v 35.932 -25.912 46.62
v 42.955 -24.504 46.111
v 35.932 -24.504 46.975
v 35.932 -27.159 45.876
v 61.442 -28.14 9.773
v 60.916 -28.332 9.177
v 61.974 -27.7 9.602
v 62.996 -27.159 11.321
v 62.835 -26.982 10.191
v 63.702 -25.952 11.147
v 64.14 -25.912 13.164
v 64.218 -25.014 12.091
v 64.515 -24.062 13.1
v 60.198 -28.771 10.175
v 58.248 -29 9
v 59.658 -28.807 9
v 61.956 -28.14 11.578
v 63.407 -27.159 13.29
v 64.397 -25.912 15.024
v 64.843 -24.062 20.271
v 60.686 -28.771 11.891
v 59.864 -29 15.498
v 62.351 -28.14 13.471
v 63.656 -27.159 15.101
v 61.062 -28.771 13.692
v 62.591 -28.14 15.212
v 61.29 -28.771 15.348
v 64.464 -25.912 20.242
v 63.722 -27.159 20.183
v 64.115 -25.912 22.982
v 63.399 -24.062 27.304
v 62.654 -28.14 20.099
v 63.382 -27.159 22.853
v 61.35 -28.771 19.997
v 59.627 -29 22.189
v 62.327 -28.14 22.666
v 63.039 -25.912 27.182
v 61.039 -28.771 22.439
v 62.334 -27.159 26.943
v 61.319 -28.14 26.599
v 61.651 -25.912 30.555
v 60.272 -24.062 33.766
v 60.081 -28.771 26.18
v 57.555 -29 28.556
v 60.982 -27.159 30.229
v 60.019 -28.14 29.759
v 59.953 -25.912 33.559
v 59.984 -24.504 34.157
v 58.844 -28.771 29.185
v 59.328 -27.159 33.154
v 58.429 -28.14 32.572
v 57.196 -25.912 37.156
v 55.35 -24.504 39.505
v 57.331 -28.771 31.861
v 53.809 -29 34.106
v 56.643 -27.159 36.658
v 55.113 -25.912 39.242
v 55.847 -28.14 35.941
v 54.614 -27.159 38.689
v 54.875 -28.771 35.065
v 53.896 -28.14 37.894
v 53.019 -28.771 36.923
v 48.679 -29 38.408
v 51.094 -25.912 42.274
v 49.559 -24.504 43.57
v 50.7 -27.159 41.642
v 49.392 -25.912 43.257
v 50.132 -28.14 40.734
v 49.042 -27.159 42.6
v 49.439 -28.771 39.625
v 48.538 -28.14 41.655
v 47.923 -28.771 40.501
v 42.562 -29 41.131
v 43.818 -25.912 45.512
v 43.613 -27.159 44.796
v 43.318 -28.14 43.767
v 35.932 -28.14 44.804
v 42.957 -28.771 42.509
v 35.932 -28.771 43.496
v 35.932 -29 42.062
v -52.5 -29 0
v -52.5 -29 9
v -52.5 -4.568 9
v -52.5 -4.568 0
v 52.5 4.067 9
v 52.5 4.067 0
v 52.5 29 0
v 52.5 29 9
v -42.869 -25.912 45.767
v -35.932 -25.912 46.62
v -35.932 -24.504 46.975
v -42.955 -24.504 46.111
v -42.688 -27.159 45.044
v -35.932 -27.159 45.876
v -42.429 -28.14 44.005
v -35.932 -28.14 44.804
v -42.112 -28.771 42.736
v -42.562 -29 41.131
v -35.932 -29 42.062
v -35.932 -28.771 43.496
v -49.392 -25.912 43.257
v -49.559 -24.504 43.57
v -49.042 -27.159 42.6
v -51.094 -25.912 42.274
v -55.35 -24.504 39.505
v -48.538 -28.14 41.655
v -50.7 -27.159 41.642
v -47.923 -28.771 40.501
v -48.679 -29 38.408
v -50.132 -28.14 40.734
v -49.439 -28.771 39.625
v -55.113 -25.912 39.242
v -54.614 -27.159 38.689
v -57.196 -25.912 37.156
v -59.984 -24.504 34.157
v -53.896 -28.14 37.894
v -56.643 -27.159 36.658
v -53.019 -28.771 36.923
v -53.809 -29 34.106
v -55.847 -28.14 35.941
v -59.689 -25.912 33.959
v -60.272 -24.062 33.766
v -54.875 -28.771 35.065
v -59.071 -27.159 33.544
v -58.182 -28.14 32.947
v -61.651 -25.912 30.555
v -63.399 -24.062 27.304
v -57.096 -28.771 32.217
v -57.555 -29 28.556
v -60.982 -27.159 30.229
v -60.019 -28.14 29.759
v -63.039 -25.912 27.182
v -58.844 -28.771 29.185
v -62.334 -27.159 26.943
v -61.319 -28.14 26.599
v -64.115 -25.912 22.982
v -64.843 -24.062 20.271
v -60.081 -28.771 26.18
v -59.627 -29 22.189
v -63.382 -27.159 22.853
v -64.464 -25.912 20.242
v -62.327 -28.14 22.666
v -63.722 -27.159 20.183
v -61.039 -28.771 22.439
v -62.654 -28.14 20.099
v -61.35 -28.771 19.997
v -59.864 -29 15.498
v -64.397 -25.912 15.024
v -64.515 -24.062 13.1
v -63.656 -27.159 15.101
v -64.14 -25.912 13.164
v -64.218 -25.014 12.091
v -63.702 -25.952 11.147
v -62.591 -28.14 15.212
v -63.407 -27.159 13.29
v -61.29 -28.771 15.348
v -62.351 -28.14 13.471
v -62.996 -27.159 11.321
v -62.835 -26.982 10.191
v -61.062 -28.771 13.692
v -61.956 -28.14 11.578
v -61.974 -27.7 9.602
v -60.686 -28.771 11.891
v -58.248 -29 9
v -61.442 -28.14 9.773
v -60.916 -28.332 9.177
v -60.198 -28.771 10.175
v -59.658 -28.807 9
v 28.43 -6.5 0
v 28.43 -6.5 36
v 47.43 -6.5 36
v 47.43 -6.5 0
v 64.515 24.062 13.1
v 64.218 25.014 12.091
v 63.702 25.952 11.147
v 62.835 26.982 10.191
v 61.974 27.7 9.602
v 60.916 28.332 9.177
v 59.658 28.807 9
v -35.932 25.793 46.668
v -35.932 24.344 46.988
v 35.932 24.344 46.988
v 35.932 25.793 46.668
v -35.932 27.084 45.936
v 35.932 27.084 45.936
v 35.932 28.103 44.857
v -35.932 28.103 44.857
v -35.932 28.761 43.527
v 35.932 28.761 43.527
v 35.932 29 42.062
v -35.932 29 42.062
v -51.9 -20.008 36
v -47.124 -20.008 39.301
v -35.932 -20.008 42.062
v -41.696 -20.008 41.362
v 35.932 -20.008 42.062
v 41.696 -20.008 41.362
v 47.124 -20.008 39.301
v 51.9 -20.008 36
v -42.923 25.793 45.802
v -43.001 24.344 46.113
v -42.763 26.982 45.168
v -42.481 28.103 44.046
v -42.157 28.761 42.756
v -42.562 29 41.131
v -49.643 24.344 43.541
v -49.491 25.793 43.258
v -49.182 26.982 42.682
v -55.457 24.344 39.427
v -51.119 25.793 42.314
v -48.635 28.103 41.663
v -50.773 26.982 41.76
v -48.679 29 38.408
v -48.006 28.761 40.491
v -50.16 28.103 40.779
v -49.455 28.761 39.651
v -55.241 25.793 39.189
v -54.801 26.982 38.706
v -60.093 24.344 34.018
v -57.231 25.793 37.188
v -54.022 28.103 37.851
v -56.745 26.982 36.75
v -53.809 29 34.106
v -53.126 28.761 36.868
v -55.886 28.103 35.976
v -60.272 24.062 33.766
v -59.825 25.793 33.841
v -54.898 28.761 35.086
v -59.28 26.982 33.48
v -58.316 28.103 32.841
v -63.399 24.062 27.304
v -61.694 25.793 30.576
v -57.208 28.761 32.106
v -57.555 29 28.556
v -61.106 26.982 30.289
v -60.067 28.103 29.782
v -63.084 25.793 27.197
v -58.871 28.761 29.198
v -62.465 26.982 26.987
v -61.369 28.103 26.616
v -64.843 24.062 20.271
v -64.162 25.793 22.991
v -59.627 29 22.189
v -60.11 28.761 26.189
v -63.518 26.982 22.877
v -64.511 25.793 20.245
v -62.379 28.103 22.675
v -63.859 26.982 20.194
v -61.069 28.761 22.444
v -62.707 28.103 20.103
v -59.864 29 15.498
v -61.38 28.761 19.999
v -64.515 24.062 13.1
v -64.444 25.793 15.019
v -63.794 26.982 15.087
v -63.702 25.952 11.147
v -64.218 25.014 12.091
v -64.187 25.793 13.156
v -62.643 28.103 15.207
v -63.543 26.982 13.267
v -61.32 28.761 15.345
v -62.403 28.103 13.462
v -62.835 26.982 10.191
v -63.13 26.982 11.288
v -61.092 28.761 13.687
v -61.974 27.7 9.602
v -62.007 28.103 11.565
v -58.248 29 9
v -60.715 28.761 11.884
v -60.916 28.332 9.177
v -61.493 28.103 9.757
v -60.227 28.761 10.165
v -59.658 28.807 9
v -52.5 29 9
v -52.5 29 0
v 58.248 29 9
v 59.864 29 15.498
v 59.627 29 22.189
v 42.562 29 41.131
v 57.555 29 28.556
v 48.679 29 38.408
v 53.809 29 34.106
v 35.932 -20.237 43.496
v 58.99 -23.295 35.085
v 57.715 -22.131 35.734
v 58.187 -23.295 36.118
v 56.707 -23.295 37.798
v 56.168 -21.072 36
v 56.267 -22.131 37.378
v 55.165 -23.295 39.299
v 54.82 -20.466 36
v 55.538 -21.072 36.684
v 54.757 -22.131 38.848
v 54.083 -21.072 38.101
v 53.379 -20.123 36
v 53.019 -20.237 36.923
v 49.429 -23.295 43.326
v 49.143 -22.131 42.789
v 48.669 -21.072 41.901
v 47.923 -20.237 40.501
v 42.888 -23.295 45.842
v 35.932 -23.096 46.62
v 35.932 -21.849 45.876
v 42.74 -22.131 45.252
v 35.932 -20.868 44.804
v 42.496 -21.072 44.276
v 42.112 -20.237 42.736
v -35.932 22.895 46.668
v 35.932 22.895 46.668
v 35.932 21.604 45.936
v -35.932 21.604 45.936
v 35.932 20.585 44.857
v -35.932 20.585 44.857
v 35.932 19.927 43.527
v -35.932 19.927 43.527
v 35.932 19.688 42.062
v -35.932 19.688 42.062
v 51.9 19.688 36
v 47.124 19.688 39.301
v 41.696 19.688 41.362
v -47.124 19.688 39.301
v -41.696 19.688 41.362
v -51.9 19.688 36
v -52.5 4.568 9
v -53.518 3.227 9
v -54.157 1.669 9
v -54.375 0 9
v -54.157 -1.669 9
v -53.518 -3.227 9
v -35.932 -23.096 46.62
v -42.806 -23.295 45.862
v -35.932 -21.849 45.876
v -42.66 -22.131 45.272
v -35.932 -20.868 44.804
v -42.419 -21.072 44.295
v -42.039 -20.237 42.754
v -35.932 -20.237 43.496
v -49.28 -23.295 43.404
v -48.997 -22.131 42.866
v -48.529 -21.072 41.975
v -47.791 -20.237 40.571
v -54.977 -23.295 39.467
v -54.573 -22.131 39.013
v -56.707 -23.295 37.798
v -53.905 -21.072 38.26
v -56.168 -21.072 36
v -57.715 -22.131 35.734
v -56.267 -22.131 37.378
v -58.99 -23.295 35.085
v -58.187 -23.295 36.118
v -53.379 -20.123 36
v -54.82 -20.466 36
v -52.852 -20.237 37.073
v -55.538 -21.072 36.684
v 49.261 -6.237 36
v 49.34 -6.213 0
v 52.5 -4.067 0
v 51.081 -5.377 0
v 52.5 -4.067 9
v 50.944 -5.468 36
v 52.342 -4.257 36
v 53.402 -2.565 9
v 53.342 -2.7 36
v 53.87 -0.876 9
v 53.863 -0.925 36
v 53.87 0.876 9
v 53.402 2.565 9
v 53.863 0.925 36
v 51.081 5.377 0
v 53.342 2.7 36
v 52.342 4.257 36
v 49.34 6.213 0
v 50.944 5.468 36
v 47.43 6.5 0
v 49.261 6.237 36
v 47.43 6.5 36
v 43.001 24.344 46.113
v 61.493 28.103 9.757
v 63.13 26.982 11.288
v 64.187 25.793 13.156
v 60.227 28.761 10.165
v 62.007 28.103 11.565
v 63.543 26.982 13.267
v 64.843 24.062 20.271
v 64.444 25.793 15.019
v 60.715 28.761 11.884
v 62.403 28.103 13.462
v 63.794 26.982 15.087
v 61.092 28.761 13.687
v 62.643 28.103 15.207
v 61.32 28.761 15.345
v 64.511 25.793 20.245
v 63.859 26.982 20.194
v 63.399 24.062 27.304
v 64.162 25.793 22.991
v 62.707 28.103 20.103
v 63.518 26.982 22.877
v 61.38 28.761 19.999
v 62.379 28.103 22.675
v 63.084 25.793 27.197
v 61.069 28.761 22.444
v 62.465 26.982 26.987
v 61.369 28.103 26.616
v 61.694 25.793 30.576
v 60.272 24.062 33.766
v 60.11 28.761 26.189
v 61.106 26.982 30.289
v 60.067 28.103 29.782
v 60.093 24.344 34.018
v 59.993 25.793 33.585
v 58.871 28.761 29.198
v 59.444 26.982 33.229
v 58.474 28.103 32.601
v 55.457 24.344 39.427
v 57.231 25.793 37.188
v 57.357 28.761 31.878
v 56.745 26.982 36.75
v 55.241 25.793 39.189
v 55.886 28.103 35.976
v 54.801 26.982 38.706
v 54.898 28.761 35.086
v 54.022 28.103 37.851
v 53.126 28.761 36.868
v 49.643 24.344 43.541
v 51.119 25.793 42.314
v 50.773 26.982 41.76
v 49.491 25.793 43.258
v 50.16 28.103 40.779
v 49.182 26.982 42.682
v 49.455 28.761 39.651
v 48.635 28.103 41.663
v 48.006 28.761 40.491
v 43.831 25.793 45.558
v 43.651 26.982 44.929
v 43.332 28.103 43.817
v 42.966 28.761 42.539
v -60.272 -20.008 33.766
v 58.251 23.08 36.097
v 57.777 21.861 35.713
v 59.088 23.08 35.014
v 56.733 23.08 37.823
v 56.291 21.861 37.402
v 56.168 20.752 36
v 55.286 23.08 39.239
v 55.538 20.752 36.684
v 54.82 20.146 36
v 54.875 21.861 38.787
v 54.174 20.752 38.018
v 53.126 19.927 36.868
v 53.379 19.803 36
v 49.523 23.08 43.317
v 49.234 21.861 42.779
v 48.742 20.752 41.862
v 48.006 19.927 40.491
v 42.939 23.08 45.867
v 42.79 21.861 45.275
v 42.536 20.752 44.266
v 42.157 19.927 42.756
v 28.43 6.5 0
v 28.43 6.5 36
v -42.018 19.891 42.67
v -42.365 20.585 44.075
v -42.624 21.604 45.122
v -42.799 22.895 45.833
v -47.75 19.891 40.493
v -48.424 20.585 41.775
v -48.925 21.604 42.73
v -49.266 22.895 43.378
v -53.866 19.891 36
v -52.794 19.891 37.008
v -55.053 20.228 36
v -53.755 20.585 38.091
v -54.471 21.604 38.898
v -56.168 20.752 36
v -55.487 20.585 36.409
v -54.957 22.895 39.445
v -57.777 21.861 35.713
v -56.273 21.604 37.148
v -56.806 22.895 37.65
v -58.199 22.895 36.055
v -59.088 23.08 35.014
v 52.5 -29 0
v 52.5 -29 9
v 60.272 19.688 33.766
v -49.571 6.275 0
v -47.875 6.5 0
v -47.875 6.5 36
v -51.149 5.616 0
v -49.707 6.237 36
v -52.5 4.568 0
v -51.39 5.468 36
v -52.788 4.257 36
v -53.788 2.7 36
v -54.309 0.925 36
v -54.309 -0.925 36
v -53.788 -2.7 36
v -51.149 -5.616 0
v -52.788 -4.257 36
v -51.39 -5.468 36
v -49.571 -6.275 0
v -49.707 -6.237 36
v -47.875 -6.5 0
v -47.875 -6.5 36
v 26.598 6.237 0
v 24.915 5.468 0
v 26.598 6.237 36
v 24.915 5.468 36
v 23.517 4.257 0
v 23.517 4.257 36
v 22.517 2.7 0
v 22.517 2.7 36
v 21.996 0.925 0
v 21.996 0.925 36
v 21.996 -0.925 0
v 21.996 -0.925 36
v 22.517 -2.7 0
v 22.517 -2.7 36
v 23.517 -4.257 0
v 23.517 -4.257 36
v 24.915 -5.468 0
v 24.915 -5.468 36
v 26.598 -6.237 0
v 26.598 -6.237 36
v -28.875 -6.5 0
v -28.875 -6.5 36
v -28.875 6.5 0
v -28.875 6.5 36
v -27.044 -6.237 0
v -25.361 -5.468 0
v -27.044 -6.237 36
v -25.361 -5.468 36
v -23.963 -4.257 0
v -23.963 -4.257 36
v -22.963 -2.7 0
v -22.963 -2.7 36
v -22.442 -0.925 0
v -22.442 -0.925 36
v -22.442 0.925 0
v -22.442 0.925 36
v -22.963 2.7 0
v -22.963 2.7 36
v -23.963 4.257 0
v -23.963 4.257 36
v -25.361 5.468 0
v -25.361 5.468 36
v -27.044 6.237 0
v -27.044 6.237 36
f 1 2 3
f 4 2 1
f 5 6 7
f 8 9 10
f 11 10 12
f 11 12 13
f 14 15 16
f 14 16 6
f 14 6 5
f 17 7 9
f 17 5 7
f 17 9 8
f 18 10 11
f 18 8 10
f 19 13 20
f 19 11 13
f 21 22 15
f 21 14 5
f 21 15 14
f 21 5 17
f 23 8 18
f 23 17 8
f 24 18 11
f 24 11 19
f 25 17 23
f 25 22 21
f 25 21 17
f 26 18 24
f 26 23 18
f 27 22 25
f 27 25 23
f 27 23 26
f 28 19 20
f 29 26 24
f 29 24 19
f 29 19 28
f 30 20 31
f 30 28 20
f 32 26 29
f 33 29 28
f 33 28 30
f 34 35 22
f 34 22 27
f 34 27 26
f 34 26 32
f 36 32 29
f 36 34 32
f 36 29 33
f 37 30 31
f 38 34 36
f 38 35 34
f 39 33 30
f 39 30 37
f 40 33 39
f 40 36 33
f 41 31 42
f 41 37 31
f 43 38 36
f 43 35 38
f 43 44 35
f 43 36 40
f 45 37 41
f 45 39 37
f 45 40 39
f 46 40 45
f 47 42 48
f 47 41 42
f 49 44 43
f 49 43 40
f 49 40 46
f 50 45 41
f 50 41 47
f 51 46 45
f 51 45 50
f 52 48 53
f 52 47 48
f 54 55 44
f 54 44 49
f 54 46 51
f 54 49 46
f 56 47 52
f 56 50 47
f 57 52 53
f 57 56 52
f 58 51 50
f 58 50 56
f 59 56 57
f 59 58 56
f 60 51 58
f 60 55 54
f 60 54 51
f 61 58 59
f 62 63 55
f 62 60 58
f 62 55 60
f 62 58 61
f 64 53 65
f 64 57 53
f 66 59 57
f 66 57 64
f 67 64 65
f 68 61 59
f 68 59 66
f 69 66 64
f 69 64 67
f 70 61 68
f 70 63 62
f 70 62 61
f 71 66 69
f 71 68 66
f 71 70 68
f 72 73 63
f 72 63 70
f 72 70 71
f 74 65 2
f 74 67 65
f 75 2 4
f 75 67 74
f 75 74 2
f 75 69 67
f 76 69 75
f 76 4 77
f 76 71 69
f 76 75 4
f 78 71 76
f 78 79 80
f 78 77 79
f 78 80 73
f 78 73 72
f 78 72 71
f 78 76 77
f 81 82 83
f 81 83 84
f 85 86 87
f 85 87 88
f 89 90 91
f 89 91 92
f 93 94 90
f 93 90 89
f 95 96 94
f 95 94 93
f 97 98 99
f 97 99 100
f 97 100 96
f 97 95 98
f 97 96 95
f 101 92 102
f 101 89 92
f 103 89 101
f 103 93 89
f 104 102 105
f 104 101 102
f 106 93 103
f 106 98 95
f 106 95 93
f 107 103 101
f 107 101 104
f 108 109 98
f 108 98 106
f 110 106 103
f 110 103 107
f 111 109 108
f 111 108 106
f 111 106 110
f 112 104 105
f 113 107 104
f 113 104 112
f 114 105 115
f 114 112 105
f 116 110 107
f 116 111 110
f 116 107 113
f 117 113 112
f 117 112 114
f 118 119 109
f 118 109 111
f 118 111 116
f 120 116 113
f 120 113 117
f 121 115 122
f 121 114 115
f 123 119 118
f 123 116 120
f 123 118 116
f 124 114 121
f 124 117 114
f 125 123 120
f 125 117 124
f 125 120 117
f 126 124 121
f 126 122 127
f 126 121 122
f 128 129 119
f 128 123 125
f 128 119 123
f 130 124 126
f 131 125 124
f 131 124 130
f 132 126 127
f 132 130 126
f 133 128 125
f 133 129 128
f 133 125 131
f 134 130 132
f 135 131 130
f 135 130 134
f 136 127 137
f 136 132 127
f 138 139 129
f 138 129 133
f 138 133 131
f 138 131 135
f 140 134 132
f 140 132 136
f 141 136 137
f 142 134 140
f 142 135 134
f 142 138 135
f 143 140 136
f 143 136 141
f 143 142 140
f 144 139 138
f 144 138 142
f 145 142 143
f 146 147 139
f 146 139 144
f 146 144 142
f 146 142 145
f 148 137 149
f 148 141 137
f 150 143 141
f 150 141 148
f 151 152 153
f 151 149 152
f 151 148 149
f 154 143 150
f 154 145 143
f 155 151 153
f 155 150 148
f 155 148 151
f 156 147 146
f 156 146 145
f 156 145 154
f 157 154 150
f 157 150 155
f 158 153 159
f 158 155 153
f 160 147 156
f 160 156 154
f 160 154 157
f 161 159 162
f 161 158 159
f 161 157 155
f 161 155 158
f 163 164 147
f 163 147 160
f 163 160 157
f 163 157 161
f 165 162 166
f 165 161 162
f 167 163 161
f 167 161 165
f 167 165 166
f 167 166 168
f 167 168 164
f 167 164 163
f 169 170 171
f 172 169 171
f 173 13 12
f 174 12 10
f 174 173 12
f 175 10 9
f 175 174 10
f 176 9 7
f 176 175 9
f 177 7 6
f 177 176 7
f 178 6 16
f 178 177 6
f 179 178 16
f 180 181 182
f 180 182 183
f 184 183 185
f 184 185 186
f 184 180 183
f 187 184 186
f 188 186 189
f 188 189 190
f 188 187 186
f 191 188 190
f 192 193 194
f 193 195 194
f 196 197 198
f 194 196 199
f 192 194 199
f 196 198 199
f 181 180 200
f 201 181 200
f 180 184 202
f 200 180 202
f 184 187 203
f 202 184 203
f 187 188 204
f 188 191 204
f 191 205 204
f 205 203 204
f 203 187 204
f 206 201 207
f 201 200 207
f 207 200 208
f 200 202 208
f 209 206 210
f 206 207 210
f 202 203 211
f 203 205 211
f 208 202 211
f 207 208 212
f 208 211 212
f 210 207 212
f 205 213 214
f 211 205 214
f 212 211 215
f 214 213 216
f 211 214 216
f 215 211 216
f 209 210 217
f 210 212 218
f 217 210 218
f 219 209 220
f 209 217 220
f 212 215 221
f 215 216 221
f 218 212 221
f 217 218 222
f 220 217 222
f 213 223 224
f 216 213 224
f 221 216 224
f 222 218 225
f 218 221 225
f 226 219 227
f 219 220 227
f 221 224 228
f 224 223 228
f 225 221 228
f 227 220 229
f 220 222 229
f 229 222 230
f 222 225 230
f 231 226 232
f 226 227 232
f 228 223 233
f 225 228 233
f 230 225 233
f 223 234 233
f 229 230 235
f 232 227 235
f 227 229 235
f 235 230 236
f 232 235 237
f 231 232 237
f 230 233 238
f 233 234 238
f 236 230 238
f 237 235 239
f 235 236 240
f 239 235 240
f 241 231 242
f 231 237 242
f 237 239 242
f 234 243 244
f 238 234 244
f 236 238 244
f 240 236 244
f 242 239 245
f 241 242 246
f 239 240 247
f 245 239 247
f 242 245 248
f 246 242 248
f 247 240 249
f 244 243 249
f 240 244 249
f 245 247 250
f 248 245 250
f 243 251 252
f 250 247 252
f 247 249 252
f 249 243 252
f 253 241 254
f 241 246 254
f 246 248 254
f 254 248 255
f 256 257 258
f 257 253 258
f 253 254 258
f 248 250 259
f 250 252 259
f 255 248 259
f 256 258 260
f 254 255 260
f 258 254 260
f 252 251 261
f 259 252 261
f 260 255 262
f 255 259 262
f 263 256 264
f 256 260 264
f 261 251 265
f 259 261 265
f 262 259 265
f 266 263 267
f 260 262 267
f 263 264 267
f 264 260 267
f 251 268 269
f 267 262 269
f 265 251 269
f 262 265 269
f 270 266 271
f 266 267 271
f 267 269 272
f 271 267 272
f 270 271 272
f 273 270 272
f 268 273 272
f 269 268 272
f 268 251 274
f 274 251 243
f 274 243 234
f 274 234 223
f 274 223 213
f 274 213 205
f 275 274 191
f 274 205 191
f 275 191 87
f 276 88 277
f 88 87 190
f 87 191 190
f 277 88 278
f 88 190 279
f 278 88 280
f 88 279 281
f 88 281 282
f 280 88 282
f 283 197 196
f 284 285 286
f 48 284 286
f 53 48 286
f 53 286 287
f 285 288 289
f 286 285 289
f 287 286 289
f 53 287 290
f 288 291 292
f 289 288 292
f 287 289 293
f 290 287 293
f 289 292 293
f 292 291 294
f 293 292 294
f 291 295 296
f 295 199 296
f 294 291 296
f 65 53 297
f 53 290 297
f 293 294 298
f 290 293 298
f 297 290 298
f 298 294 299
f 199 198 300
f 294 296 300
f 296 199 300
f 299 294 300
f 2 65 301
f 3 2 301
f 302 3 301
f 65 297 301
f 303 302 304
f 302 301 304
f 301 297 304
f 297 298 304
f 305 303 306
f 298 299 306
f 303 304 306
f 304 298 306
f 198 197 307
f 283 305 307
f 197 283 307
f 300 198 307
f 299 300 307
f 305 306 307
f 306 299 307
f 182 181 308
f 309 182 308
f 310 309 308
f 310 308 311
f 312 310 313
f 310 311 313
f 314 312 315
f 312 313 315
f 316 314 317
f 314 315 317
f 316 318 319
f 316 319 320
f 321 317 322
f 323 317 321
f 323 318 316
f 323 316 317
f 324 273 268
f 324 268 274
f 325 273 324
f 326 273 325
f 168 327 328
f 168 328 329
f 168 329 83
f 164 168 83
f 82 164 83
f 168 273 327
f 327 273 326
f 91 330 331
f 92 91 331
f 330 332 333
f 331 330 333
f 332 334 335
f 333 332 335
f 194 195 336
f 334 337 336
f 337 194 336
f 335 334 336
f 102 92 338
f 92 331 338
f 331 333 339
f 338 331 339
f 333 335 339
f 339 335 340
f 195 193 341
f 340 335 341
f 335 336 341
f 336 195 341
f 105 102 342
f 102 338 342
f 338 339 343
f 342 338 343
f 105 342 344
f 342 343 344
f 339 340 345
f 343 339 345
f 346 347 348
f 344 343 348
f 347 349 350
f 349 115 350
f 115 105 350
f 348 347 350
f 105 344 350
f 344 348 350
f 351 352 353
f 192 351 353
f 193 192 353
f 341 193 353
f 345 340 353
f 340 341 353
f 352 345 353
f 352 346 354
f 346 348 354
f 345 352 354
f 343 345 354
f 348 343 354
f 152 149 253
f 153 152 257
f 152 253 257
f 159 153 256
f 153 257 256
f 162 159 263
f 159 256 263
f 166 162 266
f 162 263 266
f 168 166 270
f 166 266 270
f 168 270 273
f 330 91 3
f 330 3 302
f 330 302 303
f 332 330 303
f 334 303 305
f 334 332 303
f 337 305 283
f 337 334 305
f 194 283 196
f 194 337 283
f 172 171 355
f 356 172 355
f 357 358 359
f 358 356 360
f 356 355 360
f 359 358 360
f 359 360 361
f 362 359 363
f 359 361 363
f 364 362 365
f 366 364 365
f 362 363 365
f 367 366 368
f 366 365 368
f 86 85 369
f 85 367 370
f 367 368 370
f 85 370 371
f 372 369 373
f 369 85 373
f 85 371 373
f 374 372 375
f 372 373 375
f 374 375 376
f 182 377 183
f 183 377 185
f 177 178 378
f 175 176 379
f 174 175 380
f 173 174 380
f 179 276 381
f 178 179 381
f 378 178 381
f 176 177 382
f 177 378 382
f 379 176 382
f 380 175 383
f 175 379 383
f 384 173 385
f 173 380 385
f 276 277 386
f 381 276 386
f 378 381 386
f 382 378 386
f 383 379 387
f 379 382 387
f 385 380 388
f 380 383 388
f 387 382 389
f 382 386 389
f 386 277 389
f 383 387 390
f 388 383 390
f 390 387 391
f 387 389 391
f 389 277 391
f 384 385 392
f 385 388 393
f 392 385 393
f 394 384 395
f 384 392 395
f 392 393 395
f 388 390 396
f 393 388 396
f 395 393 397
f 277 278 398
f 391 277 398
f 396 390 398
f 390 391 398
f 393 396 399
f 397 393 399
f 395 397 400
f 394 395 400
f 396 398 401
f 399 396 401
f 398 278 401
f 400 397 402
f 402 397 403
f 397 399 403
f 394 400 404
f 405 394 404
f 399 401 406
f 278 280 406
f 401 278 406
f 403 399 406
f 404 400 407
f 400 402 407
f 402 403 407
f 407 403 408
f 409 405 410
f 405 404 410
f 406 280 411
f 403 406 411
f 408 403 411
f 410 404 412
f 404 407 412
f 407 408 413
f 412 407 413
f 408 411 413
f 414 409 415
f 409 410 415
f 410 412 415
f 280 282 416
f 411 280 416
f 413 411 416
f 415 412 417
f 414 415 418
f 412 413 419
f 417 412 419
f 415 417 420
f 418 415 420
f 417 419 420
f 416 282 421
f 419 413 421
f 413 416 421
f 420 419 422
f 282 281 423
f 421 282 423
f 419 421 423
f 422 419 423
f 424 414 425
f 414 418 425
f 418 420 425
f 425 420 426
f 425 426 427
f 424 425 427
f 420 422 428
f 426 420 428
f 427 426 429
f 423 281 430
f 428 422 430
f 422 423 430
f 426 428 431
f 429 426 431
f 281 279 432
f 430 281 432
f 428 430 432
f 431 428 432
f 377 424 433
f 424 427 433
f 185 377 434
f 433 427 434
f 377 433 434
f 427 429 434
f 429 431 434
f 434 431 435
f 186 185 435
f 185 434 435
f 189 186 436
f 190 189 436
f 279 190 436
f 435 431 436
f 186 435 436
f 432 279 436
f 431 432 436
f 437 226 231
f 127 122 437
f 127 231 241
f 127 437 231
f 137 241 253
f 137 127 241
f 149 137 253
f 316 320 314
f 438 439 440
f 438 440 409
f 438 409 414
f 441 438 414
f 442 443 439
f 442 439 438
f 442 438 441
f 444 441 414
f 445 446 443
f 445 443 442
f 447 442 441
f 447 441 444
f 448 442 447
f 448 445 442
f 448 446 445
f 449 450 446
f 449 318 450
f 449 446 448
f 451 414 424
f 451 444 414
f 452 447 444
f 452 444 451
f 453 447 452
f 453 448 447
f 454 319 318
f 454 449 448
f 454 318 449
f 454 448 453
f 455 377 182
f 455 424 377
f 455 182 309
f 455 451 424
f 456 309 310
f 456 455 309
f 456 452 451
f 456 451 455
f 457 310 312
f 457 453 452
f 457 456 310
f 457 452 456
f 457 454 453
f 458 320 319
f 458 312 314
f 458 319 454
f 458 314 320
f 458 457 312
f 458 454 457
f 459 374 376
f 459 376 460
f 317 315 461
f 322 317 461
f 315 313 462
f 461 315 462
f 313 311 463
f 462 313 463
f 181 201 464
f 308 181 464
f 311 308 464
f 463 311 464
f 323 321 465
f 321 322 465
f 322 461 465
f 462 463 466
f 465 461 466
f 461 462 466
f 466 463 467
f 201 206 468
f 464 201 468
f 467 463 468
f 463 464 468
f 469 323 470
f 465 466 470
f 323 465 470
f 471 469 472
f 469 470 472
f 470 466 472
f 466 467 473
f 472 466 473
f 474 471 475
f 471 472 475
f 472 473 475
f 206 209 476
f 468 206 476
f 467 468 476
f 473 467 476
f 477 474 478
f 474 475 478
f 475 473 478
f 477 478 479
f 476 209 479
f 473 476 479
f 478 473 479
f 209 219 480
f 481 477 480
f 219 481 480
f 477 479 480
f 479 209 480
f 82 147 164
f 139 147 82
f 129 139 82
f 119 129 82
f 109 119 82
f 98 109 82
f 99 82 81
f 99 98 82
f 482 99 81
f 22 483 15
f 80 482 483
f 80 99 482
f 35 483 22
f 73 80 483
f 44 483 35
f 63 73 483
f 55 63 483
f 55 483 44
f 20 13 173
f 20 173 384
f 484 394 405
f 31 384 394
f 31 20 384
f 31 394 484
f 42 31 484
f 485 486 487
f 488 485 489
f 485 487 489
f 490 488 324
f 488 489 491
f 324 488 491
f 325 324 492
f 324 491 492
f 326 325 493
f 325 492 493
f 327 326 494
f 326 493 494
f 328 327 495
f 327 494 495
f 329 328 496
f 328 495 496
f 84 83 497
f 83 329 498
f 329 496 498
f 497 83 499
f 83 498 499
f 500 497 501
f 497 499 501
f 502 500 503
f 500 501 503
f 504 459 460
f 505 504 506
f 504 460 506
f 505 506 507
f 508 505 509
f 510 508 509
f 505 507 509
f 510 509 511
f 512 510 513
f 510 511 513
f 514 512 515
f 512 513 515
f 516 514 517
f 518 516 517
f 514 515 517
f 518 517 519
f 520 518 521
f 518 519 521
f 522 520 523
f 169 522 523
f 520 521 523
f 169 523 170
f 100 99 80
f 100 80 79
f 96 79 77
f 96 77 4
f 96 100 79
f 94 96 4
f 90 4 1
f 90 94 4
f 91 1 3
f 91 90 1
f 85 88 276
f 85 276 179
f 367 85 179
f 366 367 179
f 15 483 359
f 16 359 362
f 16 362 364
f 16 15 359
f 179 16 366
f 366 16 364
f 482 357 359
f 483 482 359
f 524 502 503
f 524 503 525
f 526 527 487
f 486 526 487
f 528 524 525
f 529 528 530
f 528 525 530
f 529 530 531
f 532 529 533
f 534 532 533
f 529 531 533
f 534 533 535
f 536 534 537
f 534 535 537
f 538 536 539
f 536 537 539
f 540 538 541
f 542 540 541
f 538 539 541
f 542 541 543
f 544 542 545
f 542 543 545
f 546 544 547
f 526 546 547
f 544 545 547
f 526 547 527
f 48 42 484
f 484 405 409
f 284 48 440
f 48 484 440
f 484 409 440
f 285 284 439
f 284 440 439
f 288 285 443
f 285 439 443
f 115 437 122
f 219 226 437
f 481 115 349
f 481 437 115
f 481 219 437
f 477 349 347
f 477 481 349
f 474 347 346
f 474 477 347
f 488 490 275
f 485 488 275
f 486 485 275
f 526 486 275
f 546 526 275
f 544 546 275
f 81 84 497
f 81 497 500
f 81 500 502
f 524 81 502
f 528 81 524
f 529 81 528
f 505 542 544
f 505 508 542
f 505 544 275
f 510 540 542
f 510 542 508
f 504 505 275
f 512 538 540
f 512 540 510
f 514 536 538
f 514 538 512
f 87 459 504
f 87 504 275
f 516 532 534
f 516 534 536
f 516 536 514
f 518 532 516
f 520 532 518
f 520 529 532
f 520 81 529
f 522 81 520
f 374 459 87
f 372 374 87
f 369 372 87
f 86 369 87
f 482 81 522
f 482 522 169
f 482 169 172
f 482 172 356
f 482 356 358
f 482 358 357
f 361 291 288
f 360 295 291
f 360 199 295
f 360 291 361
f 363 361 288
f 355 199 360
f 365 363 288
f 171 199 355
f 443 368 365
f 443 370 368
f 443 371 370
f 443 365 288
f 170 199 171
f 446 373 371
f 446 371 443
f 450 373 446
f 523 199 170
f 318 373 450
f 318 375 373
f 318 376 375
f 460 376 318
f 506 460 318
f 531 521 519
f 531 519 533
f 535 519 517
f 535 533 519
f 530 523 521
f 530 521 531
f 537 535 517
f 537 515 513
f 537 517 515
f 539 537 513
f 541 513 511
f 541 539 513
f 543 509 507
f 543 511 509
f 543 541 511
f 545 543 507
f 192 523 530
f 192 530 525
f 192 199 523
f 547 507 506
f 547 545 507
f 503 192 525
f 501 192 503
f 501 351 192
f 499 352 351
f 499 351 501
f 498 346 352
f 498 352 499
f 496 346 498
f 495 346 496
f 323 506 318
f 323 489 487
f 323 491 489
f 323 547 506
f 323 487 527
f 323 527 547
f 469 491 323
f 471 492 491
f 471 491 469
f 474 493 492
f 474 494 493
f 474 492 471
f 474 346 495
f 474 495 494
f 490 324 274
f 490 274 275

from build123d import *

# Parameters (mm, degrees)
F1_DEPTH      = 29
F2_W          = 39.6956643381
F2_H          = 11
F3_DEPTH      = 64.9329024958
F3_DEPTH_BACK = 94
F5_DEPTH      = 36.001
F6_T1_DEPTH   = 71.8638049916
F6_T3_DEPTH   = 39.6956643381
F6_T5_DEPTH   = 79.4647888213
F6_T10_ANGLE  = 76.3379776267
F6_T15_ANGLE  = 76.3379776267
F6_T18_ANGLE  = 132.7955508157
F6_T20_ANGLE  = 132.7955508157
F6_T22_ANGLE  = 132.7955508157
F6_T26_ANGLE  = 76.3379776267
F6_T31_ANGLE  = 76.3379776267
F6_T34_ANGLE  = 132.7955508157
F6_T39_ANGLE  = 76.3379776267
F6_T43_DEPTH  = 46.7434777317
F6_T50_DEPTH  = 46.7434777317
F6_T54_ANGLE  = 76.3379776267
F6_T61_ANGLE  = 76.3379776267
F6_T65_DEPTH  = 46.7434777317
F6_T72_DEPTH  = 46.7434777317
F6_T76_ANGLE  = 76.3379776267


# Not quite as in the source:
# - a fillet or chamfer that OpenCascade refuses, or shapes differently, is made with other operations: its cross-section is extruded or revolved along the edge and cut away or added


with BuildPart() as f1:
    # F0 (on Front) → F1 (new body, symmetric)
    with BuildSketch(Plane.XZ):
        with BuildLine():
            Line((-52.5, 9), (-52.5, 0))
            Line((-52.5, 0), (52.5, 0))
            Line((52.5, 0), (52.5, 9))
            Line((52.5, 9), (63.5, 9))
            ThreePointArc((63.5, 9), (59.4052916844, 35.0293863659), (35.9319024958, 47))
            Line((35.9319024958, 47), (-35.9319024958, 47))
            ThreePointArc((-35.9319024958, 47), (-59.4052916844, 35.0293863659), (-63.5, 9))
            Line((-63.5, 9), (-52.5, 9))
        make_face()
    extrude(amount=F1_DEPTH, both=True)

    # F2 (on Right) → F3 (cut, two sides)
    with BuildSketch(Plane.YZ) as f3_sk:
        with Locations((-0.1597600058, 41.5)):
            Rectangle(F2_W, F2_H)
    extrude(amount=-F3_DEPTH, mode=Mode.SUBTRACT)
    extrude(f3_sk.sketch, amount=F3_DEPTH_BACK, mode=Mode.SUBTRACT)

    # F4 (on face) → F5 (cut, through all)
    with BuildSketch(Plane.XY.offset(36)):
        with BuildLine():
            Line((-47.8754565308, -6.5), (-28.8754565308, -6.5))
            ThreePointArc((-28.8754565308, -6.5), (-22.3754565308, 0), (-28.8754565308, 6.5))
            Line((-28.8754565308, 6.5), (-47.8754565308, 6.5))
            ThreePointArc((-47.8754565308, 6.5), (-54.3754565308, 0), (-47.8754565308, -6.5))
        make_face()
        with BuildLine():
            Line((28.4296313102, -6.5), (47.4296313102, -6.5))
            ThreePointArc((47.4296313102, -6.5), (53.9296313102, 0), (47.4296313102, 6.5))
            Line((47.4296313102, 6.5), (28.4296313102, 6.5))
            ThreePointArc((28.4296313102, 6.5), (21.9296313102, 0), (28.4296313102, -6.5))
        make_face()
    extrude(amount=-F5_DEPTH, mode=Mode.SUBTRACT)

    # F6: fillet of radius 5 on 18 edges, made by hand

    # F6_s2 → F6_t1 (cut)
    with BuildSketch(Plane.YZ.offset(-35.9319024958)):
        with BuildLine():
            ThreePointArc((24.6890378487, 47.0004), (21.1525382574, 45.5355339059), (19.6876721633, 41.9990343146))
            Line((19.6876721633, 41.9990343146), (19.1875355947, 41.9990343146))
            ThreePointArc((19.1875355947, 41.9990343146), (19.1879355947, 44.4995171573), (19.1879355947, 47))
            Line((19.1879355947, 47), (19.6880721633, 47.5001365685))
            ThreePointArc((19.6880721633, 47.5001365685), (22.188555006, 47.5001365685), (24.6890378487, 47.5005365685))
            Line((24.6890378487, 47.5005365685), (24.6890378487, 47.0004))
        make_face()
        with BuildLine():
            ThreePointArc((23.9990343146, 47.0004), (27.5355339059, 45.5355339059), (29.0004, 41.9990343146))
            Line((29.0004, 41.9990343146), (29.5005365685, 41.9990343146))
            ThreePointArc((29.5005365685, 41.9990343146), (29.5001365685, 44.4995171573), (29.5001365685, 47))
            Line((29.5001365685, 47), (29, 47.5001365685))
            ThreePointArc((29, 47.5001365685), (26.4995171573, 47.5001365685), (23.9990343146, 47.5005365685))
            Line((23.9990343146, 47.5005365685), (23.9990343146, 47.0004))
        make_face()
        with BuildLine():
            ThreePointArc((-25.0085578603, 47.0004), (-21.4720582689, 45.5355339059), (-20.0071921748, 41.9990343146))
            Line((-20.0071921748, 41.9990343146), (-19.5070556063, 41.9990343146))
            ThreePointArc((-19.5070556063, 41.9990343146), (-19.5074556063, 44.4995171573), (-19.5074556063, 47))
            Line((-19.5074556063, 47), (-20.0075921748, 47.5001365685))
            ThreePointArc((-20.0075921748, 47.5001365685), (-22.5080750175, 47.5001365685), (-25.0085578603, 47.5005365685))
            Line((-25.0085578603, 47.5005365685), (-25.0085578603, 47.0004))
        make_face()
        with BuildLine():
            ThreePointArc((-29.0004, 41.9990343146), (-27.5355339059, 45.5355339059), (-23.9990343146, 47.0004))
            Line((-23.9990343146, 47.0004), (-23.9990343146, 47.5005365685))
            ThreePointArc((-23.9990343146, 47.5005365685), (-26.4995171573, 47.5001365685), (-29, 47.5001365685))
            Line((-29, 47.5001365685), (-29.5001365685, 47))
            ThreePointArc((-29.5001365685, 47), (-29.5001365685, 44.4995171573), (-29.5005365685, 41.9990343146))
            Line((-29.5005365685, 41.9990343146), (-29.0004, 41.9990343146))
        make_face()
    extrude(amount=F6_T1_DEPTH, mode=Mode.SUBTRACT)

    # F6_s4 → F6_t3 (cut)
    with BuildSketch(Plane.XZ.offset(-19.6880721633)):
        with BuildLine():
            ThreePointArc((-60.3101603912, 33.7074422535), (-58.4998694367, 35.3899084513), (-56.1050529687, 36.0004))
            Line((-56.1050529687, 36.0004), (-56.1050529687, 36.50064))
            ThreePointArc((-56.1050529687, 36.50064), (-57.3872947331, 36.50024), (-58.6695364976, 36.50024))
            Line((-58.6695364976, 36.50024), (-59.0617528436, 36.3104937931))
            ThreePointArc((-59.0617528436, 36.3104937931), (-59.9244071951, 35.1646112194), (-60.7306711334, 33.9783864789))
            Line((-60.7306711334, 33.9783864789), (-60.3101603912, 33.7074422535))
        make_face()
        with BuildLine():
            ThreePointArc((60.3101603912, 33.7074422535), (58.4998694367, 35.3899084513), (56.1050529687, 36.0004))
            Line((56.1050529687, 36.0004), (56.1050529687, 36.50064))
            ThreePointArc((56.1050529687, 36.50064), (57.3872947331, 36.50024), (58.6695364976, 36.50024))
            Line((58.6695364976, 36.50024), (59.0617528436, 36.3104937931))
            ThreePointArc((59.0617528436, 36.3104937931), (59.9244071951, 35.1646112194), (60.7306711334, 33.9783864789))
            Line((60.7306711334, 33.9783864789), (60.3101603912, 33.7074422535))
        make_face()
    extrude(amount=F6_T3_DEPTH, mode=Mode.SUBTRACT)

    # F6_s6 → F6_t5 (cut)
    with BuildSketch(Plane.XZ.offset(-39.7323944107)):
        with BuildLine():
            ThreePointArc((-64.526971658, 13.1683108784), (-62.8237409902, 10.1813793629), (-59.594785722, 8.9996))
            Line((-59.594785722, 8.9996), (-59.594785722, 8.4993901064))
            ThreePointArc((-59.594785722, 8.4993901064), (-61.547392861, 8.4997901064), (-63.5, 8.4997901064))
            Line((-63.5, 8.4997901064), (-63.9755115558, 8.8447624468))
            ThreePointArc((-63.9755115558, 8.8447624468), (-64.576227141, 10.945565268), (-65.0201902516, 13.0849720727))
            Line((-65.0201902516, 13.0849720727), (-64.526971658, 13.1683108784))
        make_face()
        with BuildLine():
            ThreePointArc((64.526971658, 13.1683108784), (62.8237409902, 10.1813793629), (59.594785722, 8.9996))
            Line((59.594785722, 8.9996), (59.594785722, 8.4993901064))
            ThreePointArc((59.594785722, 8.4993901064), (61.547392861, 8.4997901064), (63.5, 8.4997901064))
            Line((63.5, 8.4997901064), (63.9755115558, 8.8447624468))
            ThreePointArc((63.9755115558, 8.8447624468), (64.576227141, 10.945565268), (65.0201902516, 13.0849720727))
            Line((65.0201902516, 13.0849720727), (64.526971658, 13.1683108784))
        make_face()
    extrude(amount=F6_T5_DEPTH, mode=Mode.SUBTRACT)


with BuildPart() as f6_tool8:
    # F6_s9 → F6_t10 (revolve)
    with BuildSketch(Plane.YZ.offset(-35.9319024958)):
        with BuildLine():
            ThreePointArc((19.6876721633, 41.9990343146), (21.1525382574, 45.5355339059), (24.6890378487, 47.0004))
            Line((24.6890378487, 47.0004), (24.6890378487, 47.5005365685))
            ThreePointArc((24.6890378487, 47.5005365685), (22.188555006, 47.5001365685), (19.6880721633, 47.5001365685))
            Line((19.6880721633, 47.5001365685), (19.1879355947, 47))
            ThreePointArc((19.1879355947, 47), (19.1879355947, 44.4995171573), (19.1875355947, 41.9990343146))
            Line((19.1875355947, 41.9990343146), (19.6876721633, 41.9990343146))
        make_face()
    revolve(axis=Axis((-35.9319024958, 19.6880721633, 18), (0, -1, 0)), revolution_arc=F6_T10_ANGLE)

    split(bisect_by=Plane.XY.offset(36), keep=Keep.TOP)


with BuildPart() as f1_1:
    add(f1.part)

    # F6_t7: cut F6_tool8
    add(f6_tool8.part, mode=Mode.SUBTRACT)


with BuildPart() as f6_tool13:
    # F6_s14 → F6_t15 (revolve)
    with BuildSketch(Plane.YZ.offset(-35.9319024958)):
        with BuildLine():
            ThreePointArc((-25.0085578603, 47.0004), (-21.4720582689, 45.5355339059), (-20.0071921748, 41.9990343146))
            Line((-20.0071921748, 41.9990343146), (-19.5070556063, 41.9990343146))
            ThreePointArc((-19.5070556063, 41.9990343146), (-19.5074556063, 44.4995171573), (-19.5074556063, 47))
            Line((-19.5074556063, 47), (-20.0075921748, 47.5001365685))
            ThreePointArc((-20.0075921748, 47.5001365685), (-22.5080750175, 47.5001365685), (-25.0085578603, 47.5005365685))
            Line((-25.0085578603, 47.5005365685), (-25.0085578603, 47.0004))
        make_face()
    revolve(axis=Axis((-35.9319024958, -20.0075921748, 18), (0, -1, 0)), revolution_arc=F6_T15_ANGLE)

    split(bisect_by=Plane.XY.offset(36), keep=Keep.TOP)


with BuildPart() as f1_2:
    add(f1_1.part)

    # F6_t12: cut F6_tool13
    add(f6_tool13.part, mode=Mode.SUBTRACT)

    # F6_s17 → F6_t18 (revolve, cut)
    with BuildSketch(Plane.YZ.offset(-35.9319024958)):
        with BuildLine():
            ThreePointArc((-23.9990343146, 47.0004), (-27.5355339059, 45.5355339059), (-29.0004, 41.9990343146))
            Line((-29.0004, 41.9990343146), (-29.5005365685, 41.9990343146))
            ThreePointArc((-29.5005365685, 41.9990343146), (-29.5001365685, 44.4995171573), (-29.5001365685, 47))
            Line((-29.5001365685, 47), (-29, 47.5001365685))
            ThreePointArc((-29, 47.5001365685), (-26.4995171573, 47.5001365685), (-23.9990343146, 47.5005365685))
            Line((-23.9990343146, 47.5005365685), (-23.9990343146, 47.0004))
        make_face()
    revolve(axis=Axis((-35.9319024958, -29, 18), (0, -1, 0)), revolution_arc=F6_T18_ANGLE, mode=Mode.SUBTRACT)

    # F6_s19 → F6_t20 (revolve, cut)
    with BuildSketch(Plane.YZ.offset(-35.9319024958)):
        with BuildLine():
            ThreePointArc((23.9990343146, 47.0004), (27.5355339059, 45.5355339059), (29.0004, 41.9990343146))
            Line((29.0004, 41.9990343146), (29.5005365685, 41.9990343146))
            ThreePointArc((29.5005365685, 41.9990343146), (29.5001365685, 44.4995171573), (29.5001365685, 47))
            Line((29.5001365685, 47), (29, 47.5001365685))
            ThreePointArc((29, 47.5001365685), (26.4995171573, 47.5001365685), (23.9990343146, 47.5005365685))
            Line((23.9990343146, 47.5005365685), (23.9990343146, 47.0004))
        make_face()
    revolve(axis=Axis((-35.9319024958, 29, 18), (0, -1, 0)), revolution_arc=F6_T20_ANGLE, mode=Mode.SUBTRACT)

    # F6_s21 → F6_t22 (revolve, cut)
    with BuildSketch(Plane(origin=(25.5582063795, 0, 27.6046517371), x_dir=(0, 1, 0), z_dir=(-0.679384326, 0, -0.7337826229))):
        with BuildLine():
            ThreePointArc((-23.9990343146, 43.1376877916), (-27.5355339059, 41.6728216976), (-29.0004, 38.1363221062))
            Line((-29.0004, 38.1363221062), (-29.5005365685, 38.1363221062))
            ThreePointArc((-29.5005365685, 38.1363221062), (-29.5001365685, 40.6368049489), (-29.5001365685, 43.1372877916))
            Line((-29.5001365685, 43.1372877916), (-29, 43.6374243602))
            ThreePointArc((-29, 43.6374243602), (-26.4995171573, 43.6374243602), (-23.9990343146, 43.6378243602))
            Line((-23.9990343146, 43.6378243602), (-23.9990343146, 43.1376877916))
        make_face()
    revolve(axis=Axis((35.9319024958, -29, 18), (0, -1, 0)), revolution_arc=F6_T22_ANGLE, mode=Mode.SUBTRACT)


with BuildPart() as f6_tool24:
    # F6_s25 → F6_t26 (revolve)
    with BuildSketch(Plane(origin=(-2.1266450769, 0, 8.7490474774), x_dir=(0, 1, 0), z_dir=(0.2361941177, 0, -0.9717058911))):
        with BuildLine():
            ThreePointArc((-25.0085578603, 68.1671354515), (-21.4720582689, 66.7022693574), (-20.0071921748, 63.165769766))
            Line((-20.0071921748, 63.165769766), (-19.5070556063, 63.165769766))
            ThreePointArc((-19.5070556063, 63.165769766), (-19.5074556063, 65.6662526087), (-19.5074556063, 68.1667354515))
            Line((-19.5074556063, 68.1667354515), (-20.0075921748, 68.66687202))
            ThreePointArc((-20.0075921748, 68.66687202), (-22.5080750175, 68.66687202), (-25.0085578603, 68.66727202))
            Line((-25.0085578603, 68.66727202), (-25.0085578603, 68.1671354515))
        make_face()
    revolve(axis=Axis((35.9319024958, -20.0075921748, 18), (0, -1, 0)), revolution_arc=F6_T26_ANGLE)

    split(bisect_by=Plane.XY.offset(36), keep=Keep.TOP)


with BuildPart() as f1_3:
    add(f1_2.part)

    # F6_t23: cut F6_tool24
    add(f6_tool24.part, mode=Mode.SUBTRACT)


with BuildPart() as f6_tool29:
    # F6_s30 → F6_t31 (revolve)
    with BuildSketch(Plane(origin=(-2.1266450769, 0, 8.7490474774), x_dir=(0, 1, 0), z_dir=(0.2361941177, 0, -0.9717058911))):
        with BuildLine():
            ThreePointArc((24.6890378487, 68.1671354515), (21.1525382574, 66.7022693574), (19.6876721633, 63.165769766))
            Line((19.6876721633, 63.165769766), (19.1875355947, 63.165769766))
            ThreePointArc((19.1875355947, 63.165769766), (19.1879355947, 65.6662526087), (19.1879355947, 68.1667354515))
            Line((19.1879355947, 68.1667354515), (19.6880721633, 68.66687202))
            ThreePointArc((19.6880721633, 68.66687202), (22.188555006, 68.66687202), (24.6890378487, 68.66727202))
            Line((24.6890378487, 68.66727202), (24.6890378487, 68.1671354515))
        make_face()
    revolve(axis=Axis((35.9319024958, 19.6880721633, 18), (0, -1, 0)), revolution_arc=F6_T31_ANGLE)

    split(bisect_by=Plane.XY.offset(36), keep=Keep.TOP)


with BuildPart() as f1_4:
    add(f1_3.part)

    # F6_t28: cut F6_tool29
    add(f6_tool29.part, mode=Mode.SUBTRACT)

    # F6_s33 → F6_t34 (revolve, cut)
    with BuildSketch(Plane(origin=(25.5582063795, 0, 27.6046517371), x_dir=(0, 1, 0), z_dir=(-0.679384326, 0, -0.7337826229))):
        with BuildLine():
            ThreePointArc((23.9990343146, 43.1376877916), (27.5355339059, 41.6728216976), (29.0004, 38.1363221062))
            Line((29.0004, 38.1363221062), (29.5005365685, 38.1363221062))
            ThreePointArc((29.5005365685, 38.1363221062), (29.5001365685, 40.6368049489), (29.5001365685, 43.1372877916))
            Line((29.5001365685, 43.1372877916), (29, 43.6374243602))
            ThreePointArc((29, 43.6374243602), (26.4995171573, 43.6374243602), (23.9990343146, 43.6378243602))
            Line((23.9990343146, 43.6378243602), (23.9990343146, 43.1376877916))
        make_face()
    revolve(axis=Axis((35.9319024958, 29, 18), (0, -1, 0)), revolution_arc=F6_T34_ANGLE, mode=Mode.SUBTRACT)


with BuildPart() as f6_tool37:
    # F6_s38 → F6_t39 (revolve)
    with BuildSketch(Plane.YZ.offset(-35.9319024958)):
        with BuildLine():
            ThreePointArc((19.6876721633, 41.9990343146), (21.1525382574, 45.5355339059), (24.6890378487, 47.0004))
            Line((24.6890378487, 47.0004), (24.6890378487, 47.5005365685))
            ThreePointArc((24.6890378487, 47.5005365685), (22.188555006, 47.5001365685), (19.6880721633, 47.5001365685))
            Line((19.6880721633, 47.5001365685), (19.1879355947, 47))
            ThreePointArc((19.1879355947, 47), (19.1879355947, 44.4995171573), (19.1875355947, 41.9990343146))
            Line((19.1875355947, 41.9990343146), (19.6876721633, 41.9990343146))
        make_face()
    revolve(axis=Axis((-35.9319024958, 19.6880721633, 18), (0, -1, 0)), revolution_arc=F6_T39_ANGLE)

    split(bisect_by=Plane.XY.offset(36), keep=Keep.BOTTOM)


with BuildPart() as f6_tool41:
    # F6_s42 → F6_t43 (new body)
    with BuildSketch(Plane.XZ.offset(-26.7358855569)):
        with BuildLine():
            ThreePointArc((-60.3101603912, 33.7074422535), (-58.4998694367, 35.3899084513), (-56.1050529687, 36.0004))
            Line((-56.1050529687, 36.0004), (-56.1050529687, 36.50064))
            ThreePointArc((-56.1050529687, 36.50064), (-57.3872947331, 36.50024), (-58.6695364976, 36.50024))
            Line((-58.6695364976, 36.50024), (-59.0617528436, 36.3104937931))
            ThreePointArc((-59.0617528436, 36.3104937931), (-59.9244071951, 35.1646112194), (-60.7306711334, 33.9783864789))
            Line((-60.7306711334, 33.9783864789), (-60.3101603912, 33.7074422535))
        make_face()
    extrude(amount=F6_T43_DEPTH)

    split(bisect_by=Plane.XZ.offset(-19.6880721633), keep=Keep.BOTTOM)


with BuildPart() as f6_tool37_1:
    add(f6_tool37.part)

    # F6_t45: intersect F6_tool41
    add(f6_tool41.part, mode=Mode.INTERSECT)


with BuildPart() as f1_5:
    add(f1_4.part)

    # F6_t35: cut F6_tool37
    add(f6_tool37_1.part, mode=Mode.SUBTRACT)


with BuildPart() as f6_tool48:
    # F6_s49 → F6_t50 (new body)
    with BuildSketch(Plane.XZ.offset(-19.6880721633)):
        with BuildLine():
            ThreePointArc((-60.3101603912, 33.7074422535), (-58.4998694367, 35.3899084513), (-56.1050529687, 36.0004))
            Line((-56.1050529687, 36.0004), (-56.1050529687, 36.50064))
            ThreePointArc((-56.1050529687, 36.50064), (-57.3872947331, 36.50024), (-58.6695364976, 36.50024))
            Line((-58.6695364976, 36.50024), (-59.0617528436, 36.3104937931))
            ThreePointArc((-59.0617528436, 36.3104937931), (-59.9244071951, 35.1646112194), (-60.7306711334, 33.9783864789))
            Line((-60.7306711334, 33.9783864789), (-60.3101603912, 33.7074422535))
        make_face()
    extrude(amount=F6_T50_DEPTH)

    split(bisect_by=Plane.XZ.offset(20.0075921748), keep=Keep.TOP)


with BuildPart() as f6_tool52:
    # F6_s53 → F6_t54 (revolve)
    with BuildSketch(Plane.YZ.offset(-35.9319024958)):
        with BuildLine():
            ThreePointArc((-25.0085578603, 47.0004), (-21.4720582689, 45.5355339059), (-20.0071921748, 41.9990343146))
            Line((-20.0071921748, 41.9990343146), (-19.5070556063, 41.9990343146))
            ThreePointArc((-19.5070556063, 41.9990343146), (-19.5074556063, 44.4995171573), (-19.5074556063, 47))
            Line((-19.5074556063, 47), (-20.0075921748, 47.5001365685))
            ThreePointArc((-20.0075921748, 47.5001365685), (-22.5080750175, 47.5001365685), (-25.0085578603, 47.5005365685))
            Line((-25.0085578603, 47.5005365685), (-25.0085578603, 47.0004))
        make_face()
    revolve(axis=Axis((-35.9319024958, -20.0075921748, 18), (0, -1, 0)), revolution_arc=F6_T54_ANGLE)

    split(bisect_by=Plane.XY.offset(36), keep=Keep.BOTTOM)


with BuildPart() as f6_tool48_1:
    add(f6_tool48.part)

    # F6_t56: intersect F6_tool52
    add(f6_tool52.part, mode=Mode.INTERSECT)


with BuildPart() as f1_6:
    add(f1_5.part)

    # F6_t46: cut F6_tool48
    add(f6_tool48_1.part, mode=Mode.SUBTRACT)


with BuildPart() as f6_tool59:
    # F6_s60 → F6_t61 (revolve)
    with BuildSketch(Plane(origin=(-2.1266450769, 0, 8.7490474774), x_dir=(0, 1, 0), z_dir=(0.2361941177, 0, -0.9717058911))):
        with BuildLine():
            ThreePointArc((-25.0085578603, 68.1671354515), (-21.4720582689, 66.7022693574), (-20.0071921748, 63.165769766))
            Line((-20.0071921748, 63.165769766), (-19.5070556063, 63.165769766))
            ThreePointArc((-19.5070556063, 63.165769766), (-19.5074556063, 65.6662526087), (-19.5074556063, 68.1667354515))
            Line((-19.5074556063, 68.1667354515), (-20.0075921748, 68.66687202))
            ThreePointArc((-20.0075921748, 68.66687202), (-22.5080750175, 68.66687202), (-25.0085578603, 68.66727202))
            Line((-25.0085578603, 68.66727202), (-25.0085578603, 68.1671354515))
        make_face()
    revolve(axis=Axis((35.9319024958, -20.0075921748, 18), (0, -1, 0)), revolution_arc=F6_T61_ANGLE)

    split(bisect_by=Plane.XY.offset(36), keep=Keep.BOTTOM)


with BuildPart() as f6_tool63:
    # F6_s64 → F6_t65 (new body)
    with BuildSketch(Plane.XZ.offset(-19.6880721633)):
        with BuildLine():
            ThreePointArc((60.3101603912, 33.7074422535), (58.4998694367, 35.3899084513), (56.1050529687, 36.0004))
            Line((56.1050529687, 36.0004), (56.1050529687, 36.50064))
            ThreePointArc((56.1050529687, 36.50064), (57.3872947331, 36.50024), (58.6695364976, 36.50024))
            Line((58.6695364976, 36.50024), (59.0617528436, 36.3104937931))
            ThreePointArc((59.0617528436, 36.3104937931), (59.9244071951, 35.1646112194), (60.7306711334, 33.9783864789))
            Line((60.7306711334, 33.9783864789), (60.3101603912, 33.7074422535))
        make_face()
    extrude(amount=F6_T65_DEPTH)

    split(bisect_by=Plane.XZ.offset(20.0075921748), keep=Keep.TOP)


with BuildPart() as f6_tool59_1:
    add(f6_tool59.part)

    # F6_t67: intersect F6_tool63
    add(f6_tool63.part, mode=Mode.INTERSECT)


with BuildPart() as f1_7:
    add(f1_6.part)

    # F6_t57: cut F6_tool59
    add(f6_tool59_1.part, mode=Mode.SUBTRACT)


with BuildPart() as f6_tool70:
    # F6_s71 → F6_t72 (new body)
    with BuildSketch(Plane.XZ.offset(-26.7358855569)):
        with BuildLine():
            ThreePointArc((60.3101603912, 33.7074422535), (58.4998694367, 35.3899084513), (56.1050529687, 36.0004))
            Line((56.1050529687, 36.0004), (56.1050529687, 36.50064))
            ThreePointArc((56.1050529687, 36.50064), (57.3872947331, 36.50024), (58.6695364976, 36.50024))
            Line((58.6695364976, 36.50024), (59.0617528436, 36.3104937931))
            ThreePointArc((59.0617528436, 36.3104937931), (59.9244071951, 35.1646112194), (60.7306711334, 33.9783864789))
            Line((60.7306711334, 33.9783864789), (60.3101603912, 33.7074422535))
        make_face()
    extrude(amount=F6_T72_DEPTH)

    split(bisect_by=Plane.XZ.offset(-19.6880721633), keep=Keep.BOTTOM)


with BuildPart() as f6_tool74:
    # F6_s75 → F6_t76 (revolve)
    with BuildSketch(Plane(origin=(-2.1266450769, 0, 8.7490474774), x_dir=(0, 1, 0), z_dir=(0.2361941177, 0, -0.9717058911))):
        with BuildLine():
            ThreePointArc((24.6890378487, 68.1671354515), (21.1525382574, 66.7022693574), (19.6876721633, 63.165769766))
            Line((19.6876721633, 63.165769766), (19.1875355947, 63.165769766))
            ThreePointArc((19.1875355947, 63.165769766), (19.1879355947, 65.6662526087), (19.1879355947, 68.1667354515))
            Line((19.1879355947, 68.1667354515), (19.6880721633, 68.66687202))
            ThreePointArc((19.6880721633, 68.66687202), (22.188555006, 68.66687202), (24.6890378487, 68.66727202))
            Line((24.6890378487, 68.66727202), (24.6890378487, 68.1671354515))
        make_face()
    revolve(axis=Axis((35.9319024958, 19.6880721633, 18), (0, -1, 0)), revolution_arc=F6_T76_ANGLE)

    split(bisect_by=Plane.XY.offset(36), keep=Keep.BOTTOM)


with BuildPart() as f6_tool70_1:
    add(f6_tool70.part)

    # F6_t78: intersect F6_tool74
    add(f6_tool74.part, mode=Mode.INTERSECT)


with BuildPart() as f1_8:
    add(f1_7.part)

    # F6_t68: cut F6_tool70
    add(f6_tool70_1.part, mode=Mode.SUBTRACT)


solid = f1_8.part
